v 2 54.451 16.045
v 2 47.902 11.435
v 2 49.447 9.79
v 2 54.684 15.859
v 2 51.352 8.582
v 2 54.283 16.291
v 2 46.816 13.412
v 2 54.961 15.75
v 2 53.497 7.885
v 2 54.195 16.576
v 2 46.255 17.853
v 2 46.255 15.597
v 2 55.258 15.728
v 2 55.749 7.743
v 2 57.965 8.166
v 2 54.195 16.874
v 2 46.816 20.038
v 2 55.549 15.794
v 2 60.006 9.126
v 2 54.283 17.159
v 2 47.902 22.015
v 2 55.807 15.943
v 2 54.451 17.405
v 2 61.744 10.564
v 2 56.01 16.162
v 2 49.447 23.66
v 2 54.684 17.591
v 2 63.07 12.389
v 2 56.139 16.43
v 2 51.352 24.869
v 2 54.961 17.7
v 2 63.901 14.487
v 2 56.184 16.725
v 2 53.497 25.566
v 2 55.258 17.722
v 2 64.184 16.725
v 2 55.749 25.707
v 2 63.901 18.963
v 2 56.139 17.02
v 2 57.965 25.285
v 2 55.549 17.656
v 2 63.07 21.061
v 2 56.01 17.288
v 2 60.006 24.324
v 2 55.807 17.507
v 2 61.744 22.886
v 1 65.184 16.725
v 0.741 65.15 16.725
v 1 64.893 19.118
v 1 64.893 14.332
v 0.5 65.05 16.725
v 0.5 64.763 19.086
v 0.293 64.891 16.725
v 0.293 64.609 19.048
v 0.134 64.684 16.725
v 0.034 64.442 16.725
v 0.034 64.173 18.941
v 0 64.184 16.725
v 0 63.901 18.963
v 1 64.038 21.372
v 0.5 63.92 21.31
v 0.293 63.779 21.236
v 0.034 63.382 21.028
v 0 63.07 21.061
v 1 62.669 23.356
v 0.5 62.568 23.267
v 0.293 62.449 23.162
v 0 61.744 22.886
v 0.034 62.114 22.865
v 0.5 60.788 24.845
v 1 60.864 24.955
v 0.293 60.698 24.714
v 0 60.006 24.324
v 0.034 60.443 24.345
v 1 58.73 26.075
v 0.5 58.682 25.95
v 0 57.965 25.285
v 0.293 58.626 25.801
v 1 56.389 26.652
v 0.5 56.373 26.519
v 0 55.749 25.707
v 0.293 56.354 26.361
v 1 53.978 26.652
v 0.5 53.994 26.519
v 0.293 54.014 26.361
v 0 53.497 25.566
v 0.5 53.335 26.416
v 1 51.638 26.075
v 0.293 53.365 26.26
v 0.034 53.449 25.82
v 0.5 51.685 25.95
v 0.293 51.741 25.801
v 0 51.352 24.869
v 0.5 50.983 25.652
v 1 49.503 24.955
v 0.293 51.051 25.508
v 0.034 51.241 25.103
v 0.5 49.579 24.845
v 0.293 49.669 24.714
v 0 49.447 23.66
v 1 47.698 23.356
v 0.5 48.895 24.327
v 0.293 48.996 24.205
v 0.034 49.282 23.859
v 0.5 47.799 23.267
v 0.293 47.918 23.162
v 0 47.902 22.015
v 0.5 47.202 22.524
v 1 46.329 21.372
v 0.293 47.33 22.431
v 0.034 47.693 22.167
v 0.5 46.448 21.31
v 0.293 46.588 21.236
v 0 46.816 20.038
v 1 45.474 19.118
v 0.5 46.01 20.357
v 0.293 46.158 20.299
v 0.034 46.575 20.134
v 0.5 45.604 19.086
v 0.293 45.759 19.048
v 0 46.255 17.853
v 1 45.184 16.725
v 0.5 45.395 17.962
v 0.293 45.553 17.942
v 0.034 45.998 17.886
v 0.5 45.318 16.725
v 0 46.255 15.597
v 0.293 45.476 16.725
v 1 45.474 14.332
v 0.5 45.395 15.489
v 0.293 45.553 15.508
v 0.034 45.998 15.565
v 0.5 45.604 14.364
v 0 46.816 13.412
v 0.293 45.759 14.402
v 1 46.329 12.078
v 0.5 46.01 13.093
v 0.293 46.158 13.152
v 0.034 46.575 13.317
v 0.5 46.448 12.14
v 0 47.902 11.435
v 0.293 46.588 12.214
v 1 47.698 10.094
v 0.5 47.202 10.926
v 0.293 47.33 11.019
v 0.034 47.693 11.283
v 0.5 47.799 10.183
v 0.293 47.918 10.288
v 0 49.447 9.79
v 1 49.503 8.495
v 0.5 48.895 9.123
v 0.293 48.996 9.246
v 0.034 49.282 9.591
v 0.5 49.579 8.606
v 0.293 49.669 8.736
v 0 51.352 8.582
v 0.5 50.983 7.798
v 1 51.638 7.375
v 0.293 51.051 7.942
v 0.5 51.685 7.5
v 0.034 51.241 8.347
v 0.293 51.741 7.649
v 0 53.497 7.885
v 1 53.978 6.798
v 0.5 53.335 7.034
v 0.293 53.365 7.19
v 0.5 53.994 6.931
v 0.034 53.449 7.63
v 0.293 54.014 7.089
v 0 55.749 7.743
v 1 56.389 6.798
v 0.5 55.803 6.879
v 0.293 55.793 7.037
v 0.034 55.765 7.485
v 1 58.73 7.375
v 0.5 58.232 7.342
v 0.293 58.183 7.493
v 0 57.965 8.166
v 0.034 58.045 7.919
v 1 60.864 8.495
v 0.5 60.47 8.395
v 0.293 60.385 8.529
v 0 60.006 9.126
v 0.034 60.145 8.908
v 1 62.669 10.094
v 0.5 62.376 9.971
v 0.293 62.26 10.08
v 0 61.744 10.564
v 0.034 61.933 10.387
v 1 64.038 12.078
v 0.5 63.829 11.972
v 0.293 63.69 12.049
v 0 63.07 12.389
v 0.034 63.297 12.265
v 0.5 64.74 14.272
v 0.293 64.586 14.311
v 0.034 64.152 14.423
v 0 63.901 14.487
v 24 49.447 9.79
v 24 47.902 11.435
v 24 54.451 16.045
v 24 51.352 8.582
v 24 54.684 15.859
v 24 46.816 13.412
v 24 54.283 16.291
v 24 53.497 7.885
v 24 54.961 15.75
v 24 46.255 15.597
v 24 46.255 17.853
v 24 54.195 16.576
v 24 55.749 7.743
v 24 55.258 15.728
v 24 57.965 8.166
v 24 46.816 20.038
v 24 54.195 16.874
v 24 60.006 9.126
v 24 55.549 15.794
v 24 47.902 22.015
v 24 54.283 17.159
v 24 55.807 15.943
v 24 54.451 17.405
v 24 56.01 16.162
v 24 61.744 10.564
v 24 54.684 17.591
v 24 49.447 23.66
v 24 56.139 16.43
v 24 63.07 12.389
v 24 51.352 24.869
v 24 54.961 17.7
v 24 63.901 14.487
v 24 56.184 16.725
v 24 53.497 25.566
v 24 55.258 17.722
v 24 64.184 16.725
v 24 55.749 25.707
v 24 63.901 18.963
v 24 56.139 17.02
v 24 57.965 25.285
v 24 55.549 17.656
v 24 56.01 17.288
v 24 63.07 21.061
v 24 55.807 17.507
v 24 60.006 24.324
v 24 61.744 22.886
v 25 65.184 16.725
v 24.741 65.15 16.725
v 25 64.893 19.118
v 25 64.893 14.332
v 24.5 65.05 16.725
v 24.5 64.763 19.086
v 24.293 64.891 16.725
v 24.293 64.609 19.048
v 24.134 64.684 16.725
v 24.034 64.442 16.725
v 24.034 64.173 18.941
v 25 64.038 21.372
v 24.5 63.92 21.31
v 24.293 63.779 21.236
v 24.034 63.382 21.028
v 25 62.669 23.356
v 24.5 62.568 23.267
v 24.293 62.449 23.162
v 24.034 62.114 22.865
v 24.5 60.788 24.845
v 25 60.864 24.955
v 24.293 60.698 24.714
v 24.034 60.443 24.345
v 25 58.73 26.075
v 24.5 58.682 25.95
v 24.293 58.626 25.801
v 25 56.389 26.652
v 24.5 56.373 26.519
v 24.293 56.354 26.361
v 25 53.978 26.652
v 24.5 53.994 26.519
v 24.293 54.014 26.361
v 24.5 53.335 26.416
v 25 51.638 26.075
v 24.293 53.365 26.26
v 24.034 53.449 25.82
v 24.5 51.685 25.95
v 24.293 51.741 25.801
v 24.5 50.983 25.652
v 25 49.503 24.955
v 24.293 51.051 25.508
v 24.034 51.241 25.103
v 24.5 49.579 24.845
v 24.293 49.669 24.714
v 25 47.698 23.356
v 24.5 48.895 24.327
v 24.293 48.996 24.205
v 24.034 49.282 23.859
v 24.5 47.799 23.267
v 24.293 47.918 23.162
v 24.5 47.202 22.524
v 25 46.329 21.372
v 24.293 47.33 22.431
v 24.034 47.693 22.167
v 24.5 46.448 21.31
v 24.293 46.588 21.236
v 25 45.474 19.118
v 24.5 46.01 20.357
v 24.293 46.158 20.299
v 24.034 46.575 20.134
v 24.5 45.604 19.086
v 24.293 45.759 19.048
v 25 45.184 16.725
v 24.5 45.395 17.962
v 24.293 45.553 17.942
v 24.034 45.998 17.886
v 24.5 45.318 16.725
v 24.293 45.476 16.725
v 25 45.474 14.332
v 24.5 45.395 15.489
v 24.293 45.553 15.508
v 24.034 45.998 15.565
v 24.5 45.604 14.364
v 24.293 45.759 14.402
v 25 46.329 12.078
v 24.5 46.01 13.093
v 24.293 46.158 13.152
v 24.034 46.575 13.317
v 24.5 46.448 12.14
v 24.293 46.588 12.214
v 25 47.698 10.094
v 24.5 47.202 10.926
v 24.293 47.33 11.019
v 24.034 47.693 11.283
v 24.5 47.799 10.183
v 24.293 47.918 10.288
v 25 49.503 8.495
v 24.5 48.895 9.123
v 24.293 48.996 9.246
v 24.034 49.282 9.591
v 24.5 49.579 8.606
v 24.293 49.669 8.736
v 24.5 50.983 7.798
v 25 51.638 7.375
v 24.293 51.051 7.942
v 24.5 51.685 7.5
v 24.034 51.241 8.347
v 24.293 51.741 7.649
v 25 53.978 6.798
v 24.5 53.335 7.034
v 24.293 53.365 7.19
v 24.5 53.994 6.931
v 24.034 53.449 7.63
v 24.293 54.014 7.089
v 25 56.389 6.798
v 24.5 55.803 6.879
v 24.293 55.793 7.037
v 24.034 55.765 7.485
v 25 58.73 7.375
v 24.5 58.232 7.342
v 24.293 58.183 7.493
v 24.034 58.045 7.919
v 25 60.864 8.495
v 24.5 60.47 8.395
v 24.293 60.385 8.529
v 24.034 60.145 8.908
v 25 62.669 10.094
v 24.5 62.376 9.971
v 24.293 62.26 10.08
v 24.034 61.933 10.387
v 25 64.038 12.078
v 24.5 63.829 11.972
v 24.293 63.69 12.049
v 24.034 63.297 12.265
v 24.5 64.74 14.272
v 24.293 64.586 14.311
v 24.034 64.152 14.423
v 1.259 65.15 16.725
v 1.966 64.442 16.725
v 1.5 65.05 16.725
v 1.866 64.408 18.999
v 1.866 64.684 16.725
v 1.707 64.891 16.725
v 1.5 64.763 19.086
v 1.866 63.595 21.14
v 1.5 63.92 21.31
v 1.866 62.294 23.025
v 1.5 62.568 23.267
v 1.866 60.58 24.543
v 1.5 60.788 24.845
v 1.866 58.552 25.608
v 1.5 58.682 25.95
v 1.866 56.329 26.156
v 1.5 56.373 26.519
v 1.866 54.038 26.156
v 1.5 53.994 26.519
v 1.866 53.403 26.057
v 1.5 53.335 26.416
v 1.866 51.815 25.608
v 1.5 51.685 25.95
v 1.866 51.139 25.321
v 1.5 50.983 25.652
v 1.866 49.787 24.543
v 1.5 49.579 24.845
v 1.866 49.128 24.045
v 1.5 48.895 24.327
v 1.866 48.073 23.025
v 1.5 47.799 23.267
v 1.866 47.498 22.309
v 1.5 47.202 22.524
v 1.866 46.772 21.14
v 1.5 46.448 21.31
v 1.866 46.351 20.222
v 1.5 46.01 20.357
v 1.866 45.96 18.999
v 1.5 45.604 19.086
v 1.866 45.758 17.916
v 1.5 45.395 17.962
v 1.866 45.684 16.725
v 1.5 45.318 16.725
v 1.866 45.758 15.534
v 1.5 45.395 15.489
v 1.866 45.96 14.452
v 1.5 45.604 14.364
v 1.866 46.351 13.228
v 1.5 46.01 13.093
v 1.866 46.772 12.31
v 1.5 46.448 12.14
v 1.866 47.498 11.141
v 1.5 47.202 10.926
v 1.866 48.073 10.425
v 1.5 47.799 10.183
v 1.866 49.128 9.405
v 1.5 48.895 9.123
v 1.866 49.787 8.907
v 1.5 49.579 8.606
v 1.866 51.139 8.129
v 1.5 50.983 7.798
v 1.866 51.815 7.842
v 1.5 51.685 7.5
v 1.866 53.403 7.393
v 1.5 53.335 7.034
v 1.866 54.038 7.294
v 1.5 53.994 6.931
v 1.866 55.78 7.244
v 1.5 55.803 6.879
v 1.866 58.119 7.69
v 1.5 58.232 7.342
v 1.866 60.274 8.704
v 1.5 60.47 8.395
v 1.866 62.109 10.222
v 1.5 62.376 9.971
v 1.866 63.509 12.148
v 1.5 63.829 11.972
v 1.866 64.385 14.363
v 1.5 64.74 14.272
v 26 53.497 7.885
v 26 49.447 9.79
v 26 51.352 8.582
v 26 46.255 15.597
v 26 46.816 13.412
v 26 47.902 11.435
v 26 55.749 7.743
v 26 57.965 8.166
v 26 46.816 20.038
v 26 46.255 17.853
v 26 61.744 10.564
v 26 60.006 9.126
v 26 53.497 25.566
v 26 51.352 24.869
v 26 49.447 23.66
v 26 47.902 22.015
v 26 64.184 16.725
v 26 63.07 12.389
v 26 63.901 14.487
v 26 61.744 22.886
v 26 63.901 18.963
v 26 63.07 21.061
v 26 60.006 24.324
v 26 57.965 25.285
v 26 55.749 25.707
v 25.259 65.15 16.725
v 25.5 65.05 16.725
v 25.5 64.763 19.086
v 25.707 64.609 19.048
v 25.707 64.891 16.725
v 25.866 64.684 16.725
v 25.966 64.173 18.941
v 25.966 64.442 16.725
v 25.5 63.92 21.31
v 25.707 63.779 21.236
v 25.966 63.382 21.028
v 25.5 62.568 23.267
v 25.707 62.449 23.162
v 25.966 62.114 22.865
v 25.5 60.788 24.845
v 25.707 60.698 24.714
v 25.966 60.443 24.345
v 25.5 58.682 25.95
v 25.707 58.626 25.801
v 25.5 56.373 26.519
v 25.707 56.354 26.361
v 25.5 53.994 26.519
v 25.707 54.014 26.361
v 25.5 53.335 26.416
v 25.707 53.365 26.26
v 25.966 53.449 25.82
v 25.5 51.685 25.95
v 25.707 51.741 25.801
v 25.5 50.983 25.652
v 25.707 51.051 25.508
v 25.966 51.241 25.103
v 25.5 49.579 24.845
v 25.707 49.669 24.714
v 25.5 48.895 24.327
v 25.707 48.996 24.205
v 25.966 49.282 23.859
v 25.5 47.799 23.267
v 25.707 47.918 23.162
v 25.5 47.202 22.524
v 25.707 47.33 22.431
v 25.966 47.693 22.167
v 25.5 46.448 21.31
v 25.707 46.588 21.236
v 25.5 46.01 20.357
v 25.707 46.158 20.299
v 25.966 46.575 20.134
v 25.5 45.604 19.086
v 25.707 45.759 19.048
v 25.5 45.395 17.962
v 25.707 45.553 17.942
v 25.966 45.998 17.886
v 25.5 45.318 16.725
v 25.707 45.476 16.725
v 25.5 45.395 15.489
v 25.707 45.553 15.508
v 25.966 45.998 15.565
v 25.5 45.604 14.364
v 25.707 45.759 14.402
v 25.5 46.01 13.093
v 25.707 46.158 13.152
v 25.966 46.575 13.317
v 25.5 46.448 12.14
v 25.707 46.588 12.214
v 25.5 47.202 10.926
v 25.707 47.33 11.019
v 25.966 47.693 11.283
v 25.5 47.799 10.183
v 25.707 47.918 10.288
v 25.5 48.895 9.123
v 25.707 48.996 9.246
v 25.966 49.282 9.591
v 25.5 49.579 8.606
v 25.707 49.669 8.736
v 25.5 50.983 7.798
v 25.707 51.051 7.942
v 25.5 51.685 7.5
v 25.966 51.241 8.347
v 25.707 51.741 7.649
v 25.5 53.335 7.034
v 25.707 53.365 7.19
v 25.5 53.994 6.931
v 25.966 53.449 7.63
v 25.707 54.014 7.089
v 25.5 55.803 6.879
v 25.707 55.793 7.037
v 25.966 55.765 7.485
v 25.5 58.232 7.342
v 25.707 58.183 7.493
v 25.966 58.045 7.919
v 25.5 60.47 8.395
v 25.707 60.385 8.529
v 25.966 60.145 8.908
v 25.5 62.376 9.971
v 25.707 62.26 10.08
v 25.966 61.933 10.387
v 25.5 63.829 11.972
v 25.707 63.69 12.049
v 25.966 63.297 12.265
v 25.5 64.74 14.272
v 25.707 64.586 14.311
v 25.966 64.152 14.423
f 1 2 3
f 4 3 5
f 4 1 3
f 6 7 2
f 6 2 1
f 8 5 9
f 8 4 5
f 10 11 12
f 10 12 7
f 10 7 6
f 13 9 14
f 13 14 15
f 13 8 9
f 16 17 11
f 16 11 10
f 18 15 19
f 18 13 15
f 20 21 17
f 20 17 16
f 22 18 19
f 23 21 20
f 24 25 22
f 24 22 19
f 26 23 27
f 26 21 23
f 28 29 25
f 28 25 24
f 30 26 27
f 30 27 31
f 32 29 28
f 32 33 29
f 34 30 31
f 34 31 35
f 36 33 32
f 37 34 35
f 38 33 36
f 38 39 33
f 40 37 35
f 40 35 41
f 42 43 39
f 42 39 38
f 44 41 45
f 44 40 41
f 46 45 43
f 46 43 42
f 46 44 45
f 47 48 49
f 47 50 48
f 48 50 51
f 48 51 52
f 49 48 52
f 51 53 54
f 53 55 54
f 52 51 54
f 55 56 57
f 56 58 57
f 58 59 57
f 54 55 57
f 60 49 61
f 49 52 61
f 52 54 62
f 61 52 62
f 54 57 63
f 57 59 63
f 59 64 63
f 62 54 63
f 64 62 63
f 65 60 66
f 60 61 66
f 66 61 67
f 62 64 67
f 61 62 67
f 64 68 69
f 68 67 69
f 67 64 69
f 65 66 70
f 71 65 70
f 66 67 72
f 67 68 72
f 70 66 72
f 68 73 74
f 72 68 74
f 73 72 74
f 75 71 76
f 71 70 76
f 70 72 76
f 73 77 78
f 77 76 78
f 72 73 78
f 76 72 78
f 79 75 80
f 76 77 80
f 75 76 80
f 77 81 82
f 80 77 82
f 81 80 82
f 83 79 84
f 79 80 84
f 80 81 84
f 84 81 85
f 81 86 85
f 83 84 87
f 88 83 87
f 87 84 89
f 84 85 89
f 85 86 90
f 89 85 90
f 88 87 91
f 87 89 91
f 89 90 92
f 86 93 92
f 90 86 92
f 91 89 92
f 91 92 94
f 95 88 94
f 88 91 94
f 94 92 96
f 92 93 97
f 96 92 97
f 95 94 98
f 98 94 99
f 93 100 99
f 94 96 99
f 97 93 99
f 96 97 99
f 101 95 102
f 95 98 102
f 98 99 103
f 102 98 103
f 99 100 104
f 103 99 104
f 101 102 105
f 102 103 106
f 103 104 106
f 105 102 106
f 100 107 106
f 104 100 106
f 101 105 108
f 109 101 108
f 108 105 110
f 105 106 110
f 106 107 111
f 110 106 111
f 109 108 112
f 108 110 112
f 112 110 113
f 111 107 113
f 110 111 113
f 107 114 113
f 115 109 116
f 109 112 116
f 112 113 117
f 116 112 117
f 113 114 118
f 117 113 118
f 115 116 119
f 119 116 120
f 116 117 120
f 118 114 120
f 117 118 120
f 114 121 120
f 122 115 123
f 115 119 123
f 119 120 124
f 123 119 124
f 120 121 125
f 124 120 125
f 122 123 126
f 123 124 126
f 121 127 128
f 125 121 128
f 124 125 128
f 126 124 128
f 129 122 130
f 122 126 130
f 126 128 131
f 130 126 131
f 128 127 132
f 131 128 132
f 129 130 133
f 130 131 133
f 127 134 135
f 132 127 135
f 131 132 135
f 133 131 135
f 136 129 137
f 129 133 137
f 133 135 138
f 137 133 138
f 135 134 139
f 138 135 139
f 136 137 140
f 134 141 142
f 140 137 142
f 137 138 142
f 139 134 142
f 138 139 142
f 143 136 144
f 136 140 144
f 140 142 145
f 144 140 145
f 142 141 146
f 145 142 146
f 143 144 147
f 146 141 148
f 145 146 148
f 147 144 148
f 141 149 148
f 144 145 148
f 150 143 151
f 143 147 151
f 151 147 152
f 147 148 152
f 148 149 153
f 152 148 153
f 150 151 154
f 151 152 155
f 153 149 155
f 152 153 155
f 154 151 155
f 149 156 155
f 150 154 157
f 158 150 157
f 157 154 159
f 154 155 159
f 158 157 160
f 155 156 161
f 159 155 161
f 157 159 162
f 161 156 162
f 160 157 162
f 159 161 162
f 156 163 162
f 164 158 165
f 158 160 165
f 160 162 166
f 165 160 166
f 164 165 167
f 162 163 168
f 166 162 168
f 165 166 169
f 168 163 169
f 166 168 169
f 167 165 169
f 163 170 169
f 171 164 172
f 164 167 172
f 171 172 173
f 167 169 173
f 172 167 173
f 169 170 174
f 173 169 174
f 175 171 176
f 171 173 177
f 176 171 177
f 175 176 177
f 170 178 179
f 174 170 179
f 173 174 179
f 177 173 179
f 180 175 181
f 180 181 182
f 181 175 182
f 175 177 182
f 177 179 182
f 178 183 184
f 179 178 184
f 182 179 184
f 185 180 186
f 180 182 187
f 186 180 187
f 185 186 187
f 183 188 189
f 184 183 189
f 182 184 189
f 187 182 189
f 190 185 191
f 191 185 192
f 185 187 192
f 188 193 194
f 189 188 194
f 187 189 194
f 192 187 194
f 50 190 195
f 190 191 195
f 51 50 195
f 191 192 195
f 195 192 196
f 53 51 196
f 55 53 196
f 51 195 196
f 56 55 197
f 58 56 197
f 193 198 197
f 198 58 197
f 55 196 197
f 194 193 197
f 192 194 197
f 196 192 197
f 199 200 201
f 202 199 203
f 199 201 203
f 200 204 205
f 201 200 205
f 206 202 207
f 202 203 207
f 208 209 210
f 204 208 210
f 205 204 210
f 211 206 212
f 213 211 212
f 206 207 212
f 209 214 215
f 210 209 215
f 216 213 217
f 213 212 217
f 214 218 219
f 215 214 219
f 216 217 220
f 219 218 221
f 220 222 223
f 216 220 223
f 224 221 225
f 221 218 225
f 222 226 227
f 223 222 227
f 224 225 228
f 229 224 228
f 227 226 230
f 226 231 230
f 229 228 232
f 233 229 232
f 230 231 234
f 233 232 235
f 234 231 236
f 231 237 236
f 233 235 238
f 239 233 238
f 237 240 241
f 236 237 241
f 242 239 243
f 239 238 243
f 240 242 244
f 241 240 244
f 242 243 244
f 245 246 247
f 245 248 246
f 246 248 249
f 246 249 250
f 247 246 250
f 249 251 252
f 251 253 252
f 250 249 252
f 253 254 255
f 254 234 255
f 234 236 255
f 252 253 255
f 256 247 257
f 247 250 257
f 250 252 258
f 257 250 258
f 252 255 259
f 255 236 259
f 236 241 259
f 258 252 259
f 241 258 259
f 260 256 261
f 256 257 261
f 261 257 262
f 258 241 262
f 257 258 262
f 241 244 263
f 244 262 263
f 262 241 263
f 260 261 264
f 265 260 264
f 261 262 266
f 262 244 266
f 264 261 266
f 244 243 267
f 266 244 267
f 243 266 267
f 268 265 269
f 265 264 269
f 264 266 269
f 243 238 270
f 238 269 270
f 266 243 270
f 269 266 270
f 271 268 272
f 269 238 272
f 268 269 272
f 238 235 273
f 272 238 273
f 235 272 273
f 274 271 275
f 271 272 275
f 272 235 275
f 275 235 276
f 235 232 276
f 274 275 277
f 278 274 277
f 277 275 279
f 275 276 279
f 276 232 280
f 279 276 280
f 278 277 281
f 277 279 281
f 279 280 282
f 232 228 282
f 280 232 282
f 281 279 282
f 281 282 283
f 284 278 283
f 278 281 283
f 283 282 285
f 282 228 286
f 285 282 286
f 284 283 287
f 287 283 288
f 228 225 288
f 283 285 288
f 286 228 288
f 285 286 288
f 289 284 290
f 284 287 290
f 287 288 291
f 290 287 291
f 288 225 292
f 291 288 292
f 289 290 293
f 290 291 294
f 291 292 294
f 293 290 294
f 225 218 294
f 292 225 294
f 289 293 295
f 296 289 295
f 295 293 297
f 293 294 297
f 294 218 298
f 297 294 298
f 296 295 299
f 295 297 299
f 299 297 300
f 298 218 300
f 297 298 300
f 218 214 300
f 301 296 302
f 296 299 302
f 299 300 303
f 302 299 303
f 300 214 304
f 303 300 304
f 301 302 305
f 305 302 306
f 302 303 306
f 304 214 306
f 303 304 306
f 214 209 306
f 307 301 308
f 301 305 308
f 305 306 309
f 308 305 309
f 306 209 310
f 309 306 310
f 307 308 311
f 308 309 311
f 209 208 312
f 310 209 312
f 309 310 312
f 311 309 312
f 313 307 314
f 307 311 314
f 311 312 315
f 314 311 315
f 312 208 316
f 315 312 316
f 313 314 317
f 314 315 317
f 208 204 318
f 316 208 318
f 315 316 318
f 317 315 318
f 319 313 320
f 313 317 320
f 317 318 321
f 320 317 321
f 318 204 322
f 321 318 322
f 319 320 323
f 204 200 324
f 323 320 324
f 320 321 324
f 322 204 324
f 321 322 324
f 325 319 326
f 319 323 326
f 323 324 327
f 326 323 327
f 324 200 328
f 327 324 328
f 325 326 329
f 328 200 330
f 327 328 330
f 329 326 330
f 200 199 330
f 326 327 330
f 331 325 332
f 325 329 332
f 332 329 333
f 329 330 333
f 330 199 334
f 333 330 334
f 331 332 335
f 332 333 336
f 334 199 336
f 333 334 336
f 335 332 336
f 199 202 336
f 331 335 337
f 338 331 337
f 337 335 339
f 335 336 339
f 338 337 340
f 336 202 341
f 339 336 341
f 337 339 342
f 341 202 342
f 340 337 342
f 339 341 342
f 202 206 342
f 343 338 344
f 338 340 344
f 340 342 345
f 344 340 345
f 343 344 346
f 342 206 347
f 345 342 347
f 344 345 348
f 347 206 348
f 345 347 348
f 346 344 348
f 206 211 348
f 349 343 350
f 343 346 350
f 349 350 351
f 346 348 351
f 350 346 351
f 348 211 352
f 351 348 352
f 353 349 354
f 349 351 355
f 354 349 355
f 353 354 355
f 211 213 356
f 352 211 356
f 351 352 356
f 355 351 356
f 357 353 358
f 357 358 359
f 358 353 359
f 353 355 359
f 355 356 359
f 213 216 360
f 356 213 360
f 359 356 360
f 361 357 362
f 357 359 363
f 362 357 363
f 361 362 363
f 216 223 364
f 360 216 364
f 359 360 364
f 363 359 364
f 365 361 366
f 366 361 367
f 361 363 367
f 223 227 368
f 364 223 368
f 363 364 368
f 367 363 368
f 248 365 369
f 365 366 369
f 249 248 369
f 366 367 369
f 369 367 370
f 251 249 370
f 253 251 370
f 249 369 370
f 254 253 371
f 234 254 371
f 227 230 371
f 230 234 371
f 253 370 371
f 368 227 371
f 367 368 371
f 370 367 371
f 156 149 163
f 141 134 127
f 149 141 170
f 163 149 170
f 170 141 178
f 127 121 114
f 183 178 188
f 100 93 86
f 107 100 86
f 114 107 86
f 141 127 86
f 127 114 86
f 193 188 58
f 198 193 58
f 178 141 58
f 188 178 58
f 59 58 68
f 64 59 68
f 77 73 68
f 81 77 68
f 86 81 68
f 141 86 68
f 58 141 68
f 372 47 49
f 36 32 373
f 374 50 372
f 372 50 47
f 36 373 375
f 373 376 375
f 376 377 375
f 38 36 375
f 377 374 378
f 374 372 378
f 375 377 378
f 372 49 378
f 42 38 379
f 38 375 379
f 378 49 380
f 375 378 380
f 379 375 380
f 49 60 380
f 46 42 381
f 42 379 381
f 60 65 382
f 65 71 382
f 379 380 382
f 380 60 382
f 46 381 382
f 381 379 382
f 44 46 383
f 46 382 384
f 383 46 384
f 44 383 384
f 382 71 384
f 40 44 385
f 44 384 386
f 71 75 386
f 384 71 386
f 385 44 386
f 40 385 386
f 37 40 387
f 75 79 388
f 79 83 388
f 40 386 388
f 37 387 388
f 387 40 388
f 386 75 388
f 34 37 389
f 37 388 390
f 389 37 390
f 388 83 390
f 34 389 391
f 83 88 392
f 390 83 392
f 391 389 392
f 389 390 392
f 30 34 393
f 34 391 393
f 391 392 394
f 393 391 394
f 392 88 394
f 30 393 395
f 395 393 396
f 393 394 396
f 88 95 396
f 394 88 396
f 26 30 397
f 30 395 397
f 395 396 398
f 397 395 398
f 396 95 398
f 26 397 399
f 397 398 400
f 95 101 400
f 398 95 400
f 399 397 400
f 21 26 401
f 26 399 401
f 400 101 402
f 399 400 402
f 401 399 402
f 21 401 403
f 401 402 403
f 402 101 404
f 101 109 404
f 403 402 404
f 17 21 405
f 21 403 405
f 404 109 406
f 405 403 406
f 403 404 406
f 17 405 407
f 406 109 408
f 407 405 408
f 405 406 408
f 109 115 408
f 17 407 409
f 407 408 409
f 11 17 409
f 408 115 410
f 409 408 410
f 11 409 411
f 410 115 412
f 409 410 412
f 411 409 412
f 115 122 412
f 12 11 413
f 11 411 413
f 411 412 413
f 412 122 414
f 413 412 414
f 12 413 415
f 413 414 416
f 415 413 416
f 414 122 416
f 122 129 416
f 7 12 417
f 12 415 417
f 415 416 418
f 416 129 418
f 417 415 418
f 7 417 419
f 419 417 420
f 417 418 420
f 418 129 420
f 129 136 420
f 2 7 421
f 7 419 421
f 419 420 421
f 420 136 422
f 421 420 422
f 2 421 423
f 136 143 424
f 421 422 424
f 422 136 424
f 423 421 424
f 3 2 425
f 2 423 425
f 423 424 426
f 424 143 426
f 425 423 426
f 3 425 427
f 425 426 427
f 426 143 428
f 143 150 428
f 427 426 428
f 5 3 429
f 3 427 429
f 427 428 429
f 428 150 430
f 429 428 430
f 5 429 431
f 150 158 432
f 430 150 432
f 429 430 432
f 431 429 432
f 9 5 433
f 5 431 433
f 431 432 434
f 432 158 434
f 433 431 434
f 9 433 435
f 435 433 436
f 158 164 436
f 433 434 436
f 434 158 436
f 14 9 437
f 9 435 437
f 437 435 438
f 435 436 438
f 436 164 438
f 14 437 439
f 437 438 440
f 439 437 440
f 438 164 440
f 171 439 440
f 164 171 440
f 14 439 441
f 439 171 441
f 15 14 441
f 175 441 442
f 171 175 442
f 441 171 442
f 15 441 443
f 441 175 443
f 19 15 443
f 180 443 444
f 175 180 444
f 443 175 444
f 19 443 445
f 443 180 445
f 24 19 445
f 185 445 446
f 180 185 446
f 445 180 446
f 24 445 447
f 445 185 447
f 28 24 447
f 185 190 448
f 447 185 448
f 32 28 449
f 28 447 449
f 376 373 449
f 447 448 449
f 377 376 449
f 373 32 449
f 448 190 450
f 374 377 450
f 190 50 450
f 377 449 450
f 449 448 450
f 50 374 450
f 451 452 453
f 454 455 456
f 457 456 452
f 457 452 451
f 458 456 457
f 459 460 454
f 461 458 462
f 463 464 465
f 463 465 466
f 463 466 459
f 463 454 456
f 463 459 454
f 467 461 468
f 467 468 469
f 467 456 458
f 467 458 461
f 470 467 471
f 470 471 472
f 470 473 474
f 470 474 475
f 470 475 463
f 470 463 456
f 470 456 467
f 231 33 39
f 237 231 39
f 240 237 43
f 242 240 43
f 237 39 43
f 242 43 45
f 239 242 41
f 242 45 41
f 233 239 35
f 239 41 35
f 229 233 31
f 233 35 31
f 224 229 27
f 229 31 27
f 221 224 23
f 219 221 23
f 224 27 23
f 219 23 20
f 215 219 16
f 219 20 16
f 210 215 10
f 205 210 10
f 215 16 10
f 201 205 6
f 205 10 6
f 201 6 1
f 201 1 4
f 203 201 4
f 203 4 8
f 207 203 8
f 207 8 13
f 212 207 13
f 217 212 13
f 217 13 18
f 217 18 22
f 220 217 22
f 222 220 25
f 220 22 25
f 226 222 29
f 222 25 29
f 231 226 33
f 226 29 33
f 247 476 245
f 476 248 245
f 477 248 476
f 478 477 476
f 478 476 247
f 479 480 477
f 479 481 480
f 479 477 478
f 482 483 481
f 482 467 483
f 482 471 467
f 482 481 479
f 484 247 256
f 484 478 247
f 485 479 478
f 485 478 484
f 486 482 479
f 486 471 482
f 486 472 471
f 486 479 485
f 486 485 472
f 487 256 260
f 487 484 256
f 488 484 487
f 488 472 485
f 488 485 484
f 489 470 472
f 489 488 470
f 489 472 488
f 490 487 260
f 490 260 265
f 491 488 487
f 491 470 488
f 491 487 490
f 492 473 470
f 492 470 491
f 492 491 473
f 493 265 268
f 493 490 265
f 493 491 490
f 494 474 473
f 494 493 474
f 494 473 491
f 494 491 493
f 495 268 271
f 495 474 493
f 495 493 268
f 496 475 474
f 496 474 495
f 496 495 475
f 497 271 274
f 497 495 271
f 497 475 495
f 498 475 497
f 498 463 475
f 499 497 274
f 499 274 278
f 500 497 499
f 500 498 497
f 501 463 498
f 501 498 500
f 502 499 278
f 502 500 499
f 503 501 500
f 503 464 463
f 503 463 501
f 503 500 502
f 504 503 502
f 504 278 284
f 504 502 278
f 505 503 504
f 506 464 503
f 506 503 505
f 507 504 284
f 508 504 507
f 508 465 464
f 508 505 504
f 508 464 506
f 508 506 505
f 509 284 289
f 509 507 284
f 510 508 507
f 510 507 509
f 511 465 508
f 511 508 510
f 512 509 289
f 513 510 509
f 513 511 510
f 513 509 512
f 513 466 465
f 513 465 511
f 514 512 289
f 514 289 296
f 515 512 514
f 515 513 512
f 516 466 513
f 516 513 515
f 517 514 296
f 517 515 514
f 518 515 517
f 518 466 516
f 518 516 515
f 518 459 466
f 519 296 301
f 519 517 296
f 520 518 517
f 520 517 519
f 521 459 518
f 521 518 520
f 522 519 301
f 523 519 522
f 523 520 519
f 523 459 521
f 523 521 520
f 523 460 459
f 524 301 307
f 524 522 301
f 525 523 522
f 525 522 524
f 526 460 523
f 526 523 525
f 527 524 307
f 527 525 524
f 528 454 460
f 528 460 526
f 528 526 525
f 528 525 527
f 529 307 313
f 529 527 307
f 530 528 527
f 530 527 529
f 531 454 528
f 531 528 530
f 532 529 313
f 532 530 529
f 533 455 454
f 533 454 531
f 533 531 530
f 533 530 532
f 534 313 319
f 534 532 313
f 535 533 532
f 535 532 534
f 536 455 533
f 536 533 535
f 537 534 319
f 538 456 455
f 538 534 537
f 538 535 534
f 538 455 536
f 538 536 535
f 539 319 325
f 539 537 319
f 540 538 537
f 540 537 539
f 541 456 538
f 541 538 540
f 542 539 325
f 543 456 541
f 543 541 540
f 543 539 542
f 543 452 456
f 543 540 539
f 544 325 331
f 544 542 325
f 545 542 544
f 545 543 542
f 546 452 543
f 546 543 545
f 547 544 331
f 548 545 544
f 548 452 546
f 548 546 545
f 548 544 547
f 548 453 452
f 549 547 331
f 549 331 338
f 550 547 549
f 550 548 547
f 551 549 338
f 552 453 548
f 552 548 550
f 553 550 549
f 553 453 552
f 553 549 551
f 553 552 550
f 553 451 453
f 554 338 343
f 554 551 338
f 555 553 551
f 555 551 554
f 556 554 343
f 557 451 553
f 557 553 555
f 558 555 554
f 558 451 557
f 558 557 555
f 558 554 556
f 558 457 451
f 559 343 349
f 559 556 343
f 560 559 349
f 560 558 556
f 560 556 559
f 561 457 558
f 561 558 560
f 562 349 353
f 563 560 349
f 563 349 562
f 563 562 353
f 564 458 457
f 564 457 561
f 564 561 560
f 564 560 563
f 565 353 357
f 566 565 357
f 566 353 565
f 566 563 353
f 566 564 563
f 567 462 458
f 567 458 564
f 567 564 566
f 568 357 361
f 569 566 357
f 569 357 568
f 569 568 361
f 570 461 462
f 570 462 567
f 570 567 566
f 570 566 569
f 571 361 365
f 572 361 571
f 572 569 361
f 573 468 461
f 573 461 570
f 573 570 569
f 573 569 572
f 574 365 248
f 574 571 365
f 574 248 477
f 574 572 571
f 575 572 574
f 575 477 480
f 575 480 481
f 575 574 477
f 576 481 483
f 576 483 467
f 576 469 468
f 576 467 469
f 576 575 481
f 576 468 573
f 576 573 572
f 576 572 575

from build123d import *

# Parameters (mm, degrees)
F0_R     = 10
F1_DEPTH = 2
F2_R     = 1
F3_DEPTH = 22
F4_R     = 10
F5_DEPTH = 2
F6_R     = 0.99999


# Not quite as in the source:
# - a fillet or chamfer is up to 0.001 mm smaller than in the source, because OpenCascade refuses the exact size


with BuildPart() as f1:
    # F0 (on Right) → F1 (new body)
    with BuildSketch(Plane.YZ):
        with Locations((55.1835894585, 16.7251080275)):
            Circle(F0_R)
    extrude(amount=F1_DEPTH)

    # F2 (on face) → F3 (join)
    with BuildSketch(Plane.YZ.offset(2)):
        with Locations((55.1835894585, 16.7251080275)):
            Circle(F2_R)
    extrude(amount=F3_DEPTH)

    # F4 (on face) → F5 (join)
    with BuildSketch(Plane.YZ.offset(24)):
        with Locations((55.1835894585, 16.7251080275)):
            Circle(F4_R)
    extrude(amount=F5_DEPTH)

    # F6 (radius 1 in the source; OpenCascade refuses exactly that, so slightly less here)
    f6_edges = [f1.edges().sort_by_distance(p)[0] for p in [
        (2, 45.183589, 16.725108),
        (0, 45.183589, 16.725108),
        (26, 45.183589, 16.725108),
        (24, 45.183589, 16.725108),
    ]]
    fillet(f6_edges, radius=F6_R)


solid = f1.part
